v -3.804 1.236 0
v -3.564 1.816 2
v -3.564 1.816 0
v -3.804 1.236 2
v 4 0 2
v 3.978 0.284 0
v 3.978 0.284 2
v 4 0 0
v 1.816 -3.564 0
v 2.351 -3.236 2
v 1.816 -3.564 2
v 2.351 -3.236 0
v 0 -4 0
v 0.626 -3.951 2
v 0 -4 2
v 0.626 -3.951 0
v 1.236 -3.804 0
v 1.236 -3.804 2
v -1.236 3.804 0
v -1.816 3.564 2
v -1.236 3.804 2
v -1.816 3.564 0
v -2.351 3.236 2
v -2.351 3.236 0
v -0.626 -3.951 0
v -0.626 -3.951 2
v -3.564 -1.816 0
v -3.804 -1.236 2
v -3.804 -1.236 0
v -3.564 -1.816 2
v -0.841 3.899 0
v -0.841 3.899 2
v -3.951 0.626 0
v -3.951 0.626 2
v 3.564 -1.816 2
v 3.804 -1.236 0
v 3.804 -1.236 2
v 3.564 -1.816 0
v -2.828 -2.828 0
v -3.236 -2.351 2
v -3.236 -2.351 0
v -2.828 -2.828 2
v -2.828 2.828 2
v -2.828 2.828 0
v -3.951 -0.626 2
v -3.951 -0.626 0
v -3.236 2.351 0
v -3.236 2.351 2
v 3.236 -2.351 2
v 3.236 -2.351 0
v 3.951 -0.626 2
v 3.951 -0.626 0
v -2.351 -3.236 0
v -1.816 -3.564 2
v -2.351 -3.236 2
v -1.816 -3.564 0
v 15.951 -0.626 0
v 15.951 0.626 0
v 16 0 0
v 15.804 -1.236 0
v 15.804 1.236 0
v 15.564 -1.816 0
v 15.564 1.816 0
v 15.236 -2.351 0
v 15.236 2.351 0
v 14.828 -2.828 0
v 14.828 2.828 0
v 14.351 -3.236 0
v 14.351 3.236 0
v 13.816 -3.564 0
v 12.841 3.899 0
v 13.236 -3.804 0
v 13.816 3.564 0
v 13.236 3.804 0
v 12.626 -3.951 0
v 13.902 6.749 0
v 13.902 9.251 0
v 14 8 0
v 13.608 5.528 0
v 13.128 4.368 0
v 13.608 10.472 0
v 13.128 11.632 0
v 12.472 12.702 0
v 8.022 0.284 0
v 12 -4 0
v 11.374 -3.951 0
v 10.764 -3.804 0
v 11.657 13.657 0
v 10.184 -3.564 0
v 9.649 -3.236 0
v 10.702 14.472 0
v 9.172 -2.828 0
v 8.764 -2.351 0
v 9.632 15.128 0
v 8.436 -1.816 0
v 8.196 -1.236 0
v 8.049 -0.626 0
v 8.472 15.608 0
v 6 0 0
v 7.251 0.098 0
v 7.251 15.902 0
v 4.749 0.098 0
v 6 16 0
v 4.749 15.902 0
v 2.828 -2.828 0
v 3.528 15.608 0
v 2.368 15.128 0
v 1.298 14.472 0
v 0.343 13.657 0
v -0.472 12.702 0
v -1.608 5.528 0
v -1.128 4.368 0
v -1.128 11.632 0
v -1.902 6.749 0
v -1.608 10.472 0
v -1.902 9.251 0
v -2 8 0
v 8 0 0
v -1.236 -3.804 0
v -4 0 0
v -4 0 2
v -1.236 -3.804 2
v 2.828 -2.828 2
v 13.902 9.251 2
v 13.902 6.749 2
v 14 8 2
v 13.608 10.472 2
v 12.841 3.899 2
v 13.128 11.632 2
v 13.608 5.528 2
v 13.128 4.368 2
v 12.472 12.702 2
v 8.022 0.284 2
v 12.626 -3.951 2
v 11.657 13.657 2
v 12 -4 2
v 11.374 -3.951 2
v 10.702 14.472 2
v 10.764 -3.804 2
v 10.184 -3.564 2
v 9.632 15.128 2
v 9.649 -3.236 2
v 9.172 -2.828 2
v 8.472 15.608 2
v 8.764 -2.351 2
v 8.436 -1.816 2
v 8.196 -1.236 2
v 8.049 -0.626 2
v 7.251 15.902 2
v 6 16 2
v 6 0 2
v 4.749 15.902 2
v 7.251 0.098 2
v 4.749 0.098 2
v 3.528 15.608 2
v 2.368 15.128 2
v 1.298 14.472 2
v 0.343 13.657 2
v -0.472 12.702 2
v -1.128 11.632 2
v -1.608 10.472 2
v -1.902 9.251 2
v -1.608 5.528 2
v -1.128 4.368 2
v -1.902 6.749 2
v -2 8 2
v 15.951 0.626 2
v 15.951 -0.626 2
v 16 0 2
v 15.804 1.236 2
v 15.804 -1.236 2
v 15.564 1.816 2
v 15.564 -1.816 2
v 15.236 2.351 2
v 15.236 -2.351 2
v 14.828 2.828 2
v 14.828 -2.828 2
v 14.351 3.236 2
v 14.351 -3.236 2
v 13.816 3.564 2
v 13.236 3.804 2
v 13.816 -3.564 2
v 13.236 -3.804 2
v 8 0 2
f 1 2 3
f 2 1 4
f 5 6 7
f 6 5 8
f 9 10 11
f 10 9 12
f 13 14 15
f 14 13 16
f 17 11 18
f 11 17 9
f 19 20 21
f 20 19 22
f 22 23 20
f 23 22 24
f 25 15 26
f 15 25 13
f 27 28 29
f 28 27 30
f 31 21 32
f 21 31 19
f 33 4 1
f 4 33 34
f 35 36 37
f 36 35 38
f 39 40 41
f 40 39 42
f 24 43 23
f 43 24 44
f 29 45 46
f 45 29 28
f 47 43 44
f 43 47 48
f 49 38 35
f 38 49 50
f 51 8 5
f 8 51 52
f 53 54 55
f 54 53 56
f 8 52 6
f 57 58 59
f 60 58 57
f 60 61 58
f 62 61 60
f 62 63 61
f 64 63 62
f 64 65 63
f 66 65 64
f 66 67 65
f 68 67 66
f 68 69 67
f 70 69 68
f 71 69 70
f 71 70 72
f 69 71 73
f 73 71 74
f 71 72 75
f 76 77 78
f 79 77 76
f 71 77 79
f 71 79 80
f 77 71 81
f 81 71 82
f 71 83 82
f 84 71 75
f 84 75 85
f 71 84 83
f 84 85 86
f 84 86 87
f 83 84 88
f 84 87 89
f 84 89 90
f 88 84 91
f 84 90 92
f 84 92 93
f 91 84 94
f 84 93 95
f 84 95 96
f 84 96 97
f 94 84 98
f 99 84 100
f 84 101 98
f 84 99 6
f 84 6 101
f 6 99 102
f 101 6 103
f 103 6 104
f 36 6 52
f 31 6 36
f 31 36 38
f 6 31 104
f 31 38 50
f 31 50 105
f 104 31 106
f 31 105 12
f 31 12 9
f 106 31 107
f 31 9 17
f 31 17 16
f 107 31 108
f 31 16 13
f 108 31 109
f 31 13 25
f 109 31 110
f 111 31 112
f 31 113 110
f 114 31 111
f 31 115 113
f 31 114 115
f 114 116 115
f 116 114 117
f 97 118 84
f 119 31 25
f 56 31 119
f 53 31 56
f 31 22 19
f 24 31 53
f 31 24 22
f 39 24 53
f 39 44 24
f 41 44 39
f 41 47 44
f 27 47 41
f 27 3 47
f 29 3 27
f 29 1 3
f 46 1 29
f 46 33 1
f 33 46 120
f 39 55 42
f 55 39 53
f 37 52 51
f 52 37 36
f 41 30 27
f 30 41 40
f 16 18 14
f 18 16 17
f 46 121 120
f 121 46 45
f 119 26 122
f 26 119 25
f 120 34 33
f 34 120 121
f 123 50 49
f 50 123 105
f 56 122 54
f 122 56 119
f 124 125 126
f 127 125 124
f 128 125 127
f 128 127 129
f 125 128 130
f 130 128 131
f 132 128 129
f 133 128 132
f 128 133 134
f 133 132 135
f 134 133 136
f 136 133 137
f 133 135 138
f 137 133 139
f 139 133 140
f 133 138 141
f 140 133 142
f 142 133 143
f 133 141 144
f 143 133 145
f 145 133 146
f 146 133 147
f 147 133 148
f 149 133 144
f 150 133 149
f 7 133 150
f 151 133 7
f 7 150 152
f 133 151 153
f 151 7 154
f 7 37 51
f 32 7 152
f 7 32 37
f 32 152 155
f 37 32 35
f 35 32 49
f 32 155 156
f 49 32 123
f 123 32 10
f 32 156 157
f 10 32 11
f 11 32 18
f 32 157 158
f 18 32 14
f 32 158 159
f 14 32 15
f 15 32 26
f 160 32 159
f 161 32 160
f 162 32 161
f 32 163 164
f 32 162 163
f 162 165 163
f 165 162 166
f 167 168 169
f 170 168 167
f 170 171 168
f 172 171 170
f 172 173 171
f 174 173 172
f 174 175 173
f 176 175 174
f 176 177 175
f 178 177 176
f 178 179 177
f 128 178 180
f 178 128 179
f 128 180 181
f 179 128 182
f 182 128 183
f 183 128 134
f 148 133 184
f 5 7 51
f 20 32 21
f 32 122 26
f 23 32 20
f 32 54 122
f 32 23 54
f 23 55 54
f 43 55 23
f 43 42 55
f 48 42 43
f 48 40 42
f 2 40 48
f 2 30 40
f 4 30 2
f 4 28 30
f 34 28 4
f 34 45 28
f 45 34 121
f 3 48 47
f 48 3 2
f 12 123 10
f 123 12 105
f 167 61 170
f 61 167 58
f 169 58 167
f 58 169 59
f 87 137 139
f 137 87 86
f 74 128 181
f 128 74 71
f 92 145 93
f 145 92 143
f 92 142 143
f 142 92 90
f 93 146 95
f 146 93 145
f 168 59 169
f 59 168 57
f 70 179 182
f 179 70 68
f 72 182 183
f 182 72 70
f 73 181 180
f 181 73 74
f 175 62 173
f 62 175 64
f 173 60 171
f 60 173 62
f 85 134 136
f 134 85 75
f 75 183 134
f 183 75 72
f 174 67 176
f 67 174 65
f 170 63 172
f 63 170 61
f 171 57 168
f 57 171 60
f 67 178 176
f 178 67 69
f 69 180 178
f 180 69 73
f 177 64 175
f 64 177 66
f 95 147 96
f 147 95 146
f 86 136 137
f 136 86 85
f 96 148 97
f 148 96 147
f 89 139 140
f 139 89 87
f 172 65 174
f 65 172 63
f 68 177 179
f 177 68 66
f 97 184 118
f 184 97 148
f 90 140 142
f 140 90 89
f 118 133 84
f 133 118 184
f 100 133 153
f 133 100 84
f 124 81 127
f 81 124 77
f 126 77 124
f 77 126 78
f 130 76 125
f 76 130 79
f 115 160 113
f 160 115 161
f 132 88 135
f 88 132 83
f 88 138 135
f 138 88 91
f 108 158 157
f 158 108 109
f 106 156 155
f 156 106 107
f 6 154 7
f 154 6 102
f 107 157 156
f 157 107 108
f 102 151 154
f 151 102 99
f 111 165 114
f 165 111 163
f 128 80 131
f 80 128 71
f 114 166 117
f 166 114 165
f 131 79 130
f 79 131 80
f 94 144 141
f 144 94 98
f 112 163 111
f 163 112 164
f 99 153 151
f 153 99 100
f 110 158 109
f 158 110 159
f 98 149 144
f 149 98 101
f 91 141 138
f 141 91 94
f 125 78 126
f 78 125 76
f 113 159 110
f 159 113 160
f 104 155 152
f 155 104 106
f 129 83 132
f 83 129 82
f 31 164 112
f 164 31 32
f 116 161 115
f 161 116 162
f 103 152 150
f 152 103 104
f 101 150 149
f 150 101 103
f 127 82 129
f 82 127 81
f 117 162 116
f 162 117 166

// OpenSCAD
//3D Shapes- Design Time: Mouse

$fn = 40;

cylinder(2, 4, 4);
translate([12,0,0]) cylinder(2, 4, 4);
translate([6,8,0]) cylinder(2, 8, 8);
